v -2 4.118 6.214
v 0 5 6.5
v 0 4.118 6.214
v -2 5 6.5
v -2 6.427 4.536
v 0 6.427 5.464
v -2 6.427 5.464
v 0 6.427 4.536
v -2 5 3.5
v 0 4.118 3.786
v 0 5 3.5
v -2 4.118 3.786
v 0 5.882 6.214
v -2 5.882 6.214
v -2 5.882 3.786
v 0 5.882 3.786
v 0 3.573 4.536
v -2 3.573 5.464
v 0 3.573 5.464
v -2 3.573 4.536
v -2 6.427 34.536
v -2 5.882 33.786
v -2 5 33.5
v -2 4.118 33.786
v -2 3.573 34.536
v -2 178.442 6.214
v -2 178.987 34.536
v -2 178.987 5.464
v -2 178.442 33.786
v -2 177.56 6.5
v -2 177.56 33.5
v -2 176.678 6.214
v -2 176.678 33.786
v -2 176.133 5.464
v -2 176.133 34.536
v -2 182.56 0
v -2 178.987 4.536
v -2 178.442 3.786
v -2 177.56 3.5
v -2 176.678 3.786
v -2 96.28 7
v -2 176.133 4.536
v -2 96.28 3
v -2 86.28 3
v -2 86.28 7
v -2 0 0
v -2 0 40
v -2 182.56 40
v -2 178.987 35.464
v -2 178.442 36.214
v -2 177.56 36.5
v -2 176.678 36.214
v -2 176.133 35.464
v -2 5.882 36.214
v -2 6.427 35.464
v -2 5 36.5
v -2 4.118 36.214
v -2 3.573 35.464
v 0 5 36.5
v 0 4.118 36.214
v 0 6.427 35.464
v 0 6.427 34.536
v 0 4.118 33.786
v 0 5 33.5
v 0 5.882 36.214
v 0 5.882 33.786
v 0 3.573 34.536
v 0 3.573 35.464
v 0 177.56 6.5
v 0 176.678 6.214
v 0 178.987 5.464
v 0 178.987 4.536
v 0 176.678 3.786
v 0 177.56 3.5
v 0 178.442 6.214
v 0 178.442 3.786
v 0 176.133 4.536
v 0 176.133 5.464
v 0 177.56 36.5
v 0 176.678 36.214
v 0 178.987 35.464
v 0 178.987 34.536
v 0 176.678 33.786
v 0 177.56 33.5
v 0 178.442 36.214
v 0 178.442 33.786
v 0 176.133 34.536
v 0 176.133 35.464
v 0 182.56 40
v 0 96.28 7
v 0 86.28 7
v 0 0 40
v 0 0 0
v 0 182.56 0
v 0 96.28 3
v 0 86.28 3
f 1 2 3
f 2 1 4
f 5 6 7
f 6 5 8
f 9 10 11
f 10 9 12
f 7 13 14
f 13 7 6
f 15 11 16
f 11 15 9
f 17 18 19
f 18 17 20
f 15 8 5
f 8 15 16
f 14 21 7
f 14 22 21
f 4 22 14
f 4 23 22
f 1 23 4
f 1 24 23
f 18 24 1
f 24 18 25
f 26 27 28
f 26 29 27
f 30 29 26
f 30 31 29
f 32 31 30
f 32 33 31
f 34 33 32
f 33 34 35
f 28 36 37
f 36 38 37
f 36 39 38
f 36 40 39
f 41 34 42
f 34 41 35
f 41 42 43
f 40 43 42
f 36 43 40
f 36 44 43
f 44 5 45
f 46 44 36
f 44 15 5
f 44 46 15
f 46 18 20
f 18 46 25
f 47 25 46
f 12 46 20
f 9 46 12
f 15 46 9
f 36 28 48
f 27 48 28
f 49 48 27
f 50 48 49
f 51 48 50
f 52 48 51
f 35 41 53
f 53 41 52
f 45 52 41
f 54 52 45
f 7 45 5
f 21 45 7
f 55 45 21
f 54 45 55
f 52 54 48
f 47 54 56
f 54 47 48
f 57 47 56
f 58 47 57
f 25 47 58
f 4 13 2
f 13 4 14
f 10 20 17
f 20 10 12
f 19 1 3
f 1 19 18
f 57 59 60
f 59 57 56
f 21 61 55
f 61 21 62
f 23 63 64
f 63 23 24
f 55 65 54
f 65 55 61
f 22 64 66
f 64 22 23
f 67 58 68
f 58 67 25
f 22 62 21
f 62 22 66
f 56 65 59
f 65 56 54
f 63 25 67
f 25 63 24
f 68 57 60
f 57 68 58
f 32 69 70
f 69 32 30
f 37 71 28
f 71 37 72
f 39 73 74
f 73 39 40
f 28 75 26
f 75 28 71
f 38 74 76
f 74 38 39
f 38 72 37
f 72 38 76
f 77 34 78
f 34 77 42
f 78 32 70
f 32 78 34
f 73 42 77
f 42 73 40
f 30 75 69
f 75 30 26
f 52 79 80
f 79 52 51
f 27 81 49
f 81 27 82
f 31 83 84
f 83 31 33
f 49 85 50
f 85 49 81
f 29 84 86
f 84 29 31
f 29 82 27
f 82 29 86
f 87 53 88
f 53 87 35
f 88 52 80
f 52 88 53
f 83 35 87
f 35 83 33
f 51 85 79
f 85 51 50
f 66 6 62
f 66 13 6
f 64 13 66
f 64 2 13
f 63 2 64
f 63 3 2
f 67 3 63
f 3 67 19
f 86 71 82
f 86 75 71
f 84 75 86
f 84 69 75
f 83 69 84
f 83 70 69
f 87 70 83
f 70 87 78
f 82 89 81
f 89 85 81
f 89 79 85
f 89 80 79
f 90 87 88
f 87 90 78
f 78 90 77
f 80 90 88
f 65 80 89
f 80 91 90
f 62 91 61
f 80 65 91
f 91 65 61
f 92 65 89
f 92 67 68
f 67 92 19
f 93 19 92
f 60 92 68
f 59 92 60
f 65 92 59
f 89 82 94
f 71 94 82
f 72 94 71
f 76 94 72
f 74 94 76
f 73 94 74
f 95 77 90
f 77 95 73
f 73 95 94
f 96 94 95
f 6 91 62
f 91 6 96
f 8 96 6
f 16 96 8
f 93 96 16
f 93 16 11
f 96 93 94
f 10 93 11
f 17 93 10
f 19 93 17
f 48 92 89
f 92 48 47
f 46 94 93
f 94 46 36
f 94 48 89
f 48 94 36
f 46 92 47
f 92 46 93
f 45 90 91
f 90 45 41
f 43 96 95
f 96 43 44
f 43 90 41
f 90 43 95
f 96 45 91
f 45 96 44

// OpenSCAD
board_thickness = 2;

in = 25.4;
board_height = 1.1*in;
board_length = 1.6*in;

display_height = 16;
display_thickness = 8;
    
margin = 10;
wall_thickness = 2;
screen_length = board_length*4;
total_length = screen_length+2*margin;

body_size = 40;
cut_pos = 12;
screen_pos = 21;
screw_hole = 2.8;

c3_x = 21;
c3_y = 17.8;
c3_z = 1.57;
    
screw_box_size = 10;


module display() {
    
    translate([(board_height-display_height)/2,0,board_thickness])
            cube([display_height, 40, display_thickness]);
    
    difference() {
        cube([board_height, board_length, board_thickness]);
        
        display_holes(4);
    }

}

module display_holes(d) {
    for (y = [0.1*in, 1.5*in]){
        for (x = [0.1*in, 1.0*in]) {
            translate([x, y, 0])
            cylinder(h=6, d=d, $fn=10);
        }
    }
}

module cut_box(x, y, z, cut) {
    difference() {
        cube([x, y, z]);
        
        translate([x-cut, 0, z-cut])
        rotate([0, 45, 0])
        translate([-x, -10, 0])
        cube([x*2, y+20, z]);
    }
}
module body() {

    difference () {
        cut_box(body_size,total_length,body_size, cut_pos);
        
        translate([-wall_thickness, wall_thickness, wall_thickness])
        cut_box(
        body_size,
        total_length-wall_thickness*2,
        body_size-wall_thickness*2,
        cut_pos-wall_thickness+8/sqrt(2));
        
        translate([body_size-cut_pos, margin, body_size-cut_pos])
        rotate([0, 45, 0])
        translate([-display_height/2, 0, -display_thickness-1])
        cube([display_height, screen_length, 2+display_thickness]);
        
        translate_screen() display_holes(screw_hole);
    }

    for (y = [0, total_length-screw_box_size]) {
        for (z = [0, body_size-screw_box_size]) {
            translate([0, y, z])
            difference() {
                cube([screw_box_size, screw_box_size, screw_box_size]);
                
                translate([0, screw_box_size/2, screw_box_size/2])
                rotate([0, 90, 0])
                #cylinder(h=screw_box_size, d=screw_hole, $fn=10, center=false);
            }
        }
    }

    translate([0, total_length/2-c3_x/2, 0])
    difference () {
        cube([c3_x+wall_thickness, c3_y+wall_thickness*2, wall_thickness*2+c3_z]);
        
        translate([0, wall_thickness, wall_thickness])
        cube([c3_x, c3_y, c3_z]);
        
        translate([0, wall_thickness*1.5, wall_thickness])
        cube([c3_x+10, c3_y-wall_thickness, 10]);
        
        translate([wall_thickness*3, -1, wall_thickness])
        cube([c3_x-wall_thickness*4, c3_y+10, 10]);
    }
}

module translate_screen() {
    translate([screen_pos, margin, screen_pos])
    rotate([0, 45, 0])
    translate([-board_height/2, 0, 0])
    
    for (i  = [0, 1, 2, 3]) {
        translate([0, board_length*i, 0])
        children();
    }
}

module displays() {
    translate_screen()
    display();
}

module lid() {
    difference() {
        translate([-wall_thickness, 0, 0])
        cube([wall_thickness, total_length, body_size]);
        
        for (y = [0, total_length-screw_box_size]) {
            for (z = [0, body_size-screw_box_size]) {
                translate([0, y, z])
                    translate([-wall_thickness, screw_box_size/2, screw_box_size/2])
                    rotate([0, 90, 0])
                    #cylinder(h=screw_box_size, d=3, $fn=10, center=false);
            }
        }
        
        translate([0, total_length/2, 5])
        cube([10, 10, 4], center=true);
    }
}

//body();
lid();

//displays();

//translate([-50, 0, 0]) display();
